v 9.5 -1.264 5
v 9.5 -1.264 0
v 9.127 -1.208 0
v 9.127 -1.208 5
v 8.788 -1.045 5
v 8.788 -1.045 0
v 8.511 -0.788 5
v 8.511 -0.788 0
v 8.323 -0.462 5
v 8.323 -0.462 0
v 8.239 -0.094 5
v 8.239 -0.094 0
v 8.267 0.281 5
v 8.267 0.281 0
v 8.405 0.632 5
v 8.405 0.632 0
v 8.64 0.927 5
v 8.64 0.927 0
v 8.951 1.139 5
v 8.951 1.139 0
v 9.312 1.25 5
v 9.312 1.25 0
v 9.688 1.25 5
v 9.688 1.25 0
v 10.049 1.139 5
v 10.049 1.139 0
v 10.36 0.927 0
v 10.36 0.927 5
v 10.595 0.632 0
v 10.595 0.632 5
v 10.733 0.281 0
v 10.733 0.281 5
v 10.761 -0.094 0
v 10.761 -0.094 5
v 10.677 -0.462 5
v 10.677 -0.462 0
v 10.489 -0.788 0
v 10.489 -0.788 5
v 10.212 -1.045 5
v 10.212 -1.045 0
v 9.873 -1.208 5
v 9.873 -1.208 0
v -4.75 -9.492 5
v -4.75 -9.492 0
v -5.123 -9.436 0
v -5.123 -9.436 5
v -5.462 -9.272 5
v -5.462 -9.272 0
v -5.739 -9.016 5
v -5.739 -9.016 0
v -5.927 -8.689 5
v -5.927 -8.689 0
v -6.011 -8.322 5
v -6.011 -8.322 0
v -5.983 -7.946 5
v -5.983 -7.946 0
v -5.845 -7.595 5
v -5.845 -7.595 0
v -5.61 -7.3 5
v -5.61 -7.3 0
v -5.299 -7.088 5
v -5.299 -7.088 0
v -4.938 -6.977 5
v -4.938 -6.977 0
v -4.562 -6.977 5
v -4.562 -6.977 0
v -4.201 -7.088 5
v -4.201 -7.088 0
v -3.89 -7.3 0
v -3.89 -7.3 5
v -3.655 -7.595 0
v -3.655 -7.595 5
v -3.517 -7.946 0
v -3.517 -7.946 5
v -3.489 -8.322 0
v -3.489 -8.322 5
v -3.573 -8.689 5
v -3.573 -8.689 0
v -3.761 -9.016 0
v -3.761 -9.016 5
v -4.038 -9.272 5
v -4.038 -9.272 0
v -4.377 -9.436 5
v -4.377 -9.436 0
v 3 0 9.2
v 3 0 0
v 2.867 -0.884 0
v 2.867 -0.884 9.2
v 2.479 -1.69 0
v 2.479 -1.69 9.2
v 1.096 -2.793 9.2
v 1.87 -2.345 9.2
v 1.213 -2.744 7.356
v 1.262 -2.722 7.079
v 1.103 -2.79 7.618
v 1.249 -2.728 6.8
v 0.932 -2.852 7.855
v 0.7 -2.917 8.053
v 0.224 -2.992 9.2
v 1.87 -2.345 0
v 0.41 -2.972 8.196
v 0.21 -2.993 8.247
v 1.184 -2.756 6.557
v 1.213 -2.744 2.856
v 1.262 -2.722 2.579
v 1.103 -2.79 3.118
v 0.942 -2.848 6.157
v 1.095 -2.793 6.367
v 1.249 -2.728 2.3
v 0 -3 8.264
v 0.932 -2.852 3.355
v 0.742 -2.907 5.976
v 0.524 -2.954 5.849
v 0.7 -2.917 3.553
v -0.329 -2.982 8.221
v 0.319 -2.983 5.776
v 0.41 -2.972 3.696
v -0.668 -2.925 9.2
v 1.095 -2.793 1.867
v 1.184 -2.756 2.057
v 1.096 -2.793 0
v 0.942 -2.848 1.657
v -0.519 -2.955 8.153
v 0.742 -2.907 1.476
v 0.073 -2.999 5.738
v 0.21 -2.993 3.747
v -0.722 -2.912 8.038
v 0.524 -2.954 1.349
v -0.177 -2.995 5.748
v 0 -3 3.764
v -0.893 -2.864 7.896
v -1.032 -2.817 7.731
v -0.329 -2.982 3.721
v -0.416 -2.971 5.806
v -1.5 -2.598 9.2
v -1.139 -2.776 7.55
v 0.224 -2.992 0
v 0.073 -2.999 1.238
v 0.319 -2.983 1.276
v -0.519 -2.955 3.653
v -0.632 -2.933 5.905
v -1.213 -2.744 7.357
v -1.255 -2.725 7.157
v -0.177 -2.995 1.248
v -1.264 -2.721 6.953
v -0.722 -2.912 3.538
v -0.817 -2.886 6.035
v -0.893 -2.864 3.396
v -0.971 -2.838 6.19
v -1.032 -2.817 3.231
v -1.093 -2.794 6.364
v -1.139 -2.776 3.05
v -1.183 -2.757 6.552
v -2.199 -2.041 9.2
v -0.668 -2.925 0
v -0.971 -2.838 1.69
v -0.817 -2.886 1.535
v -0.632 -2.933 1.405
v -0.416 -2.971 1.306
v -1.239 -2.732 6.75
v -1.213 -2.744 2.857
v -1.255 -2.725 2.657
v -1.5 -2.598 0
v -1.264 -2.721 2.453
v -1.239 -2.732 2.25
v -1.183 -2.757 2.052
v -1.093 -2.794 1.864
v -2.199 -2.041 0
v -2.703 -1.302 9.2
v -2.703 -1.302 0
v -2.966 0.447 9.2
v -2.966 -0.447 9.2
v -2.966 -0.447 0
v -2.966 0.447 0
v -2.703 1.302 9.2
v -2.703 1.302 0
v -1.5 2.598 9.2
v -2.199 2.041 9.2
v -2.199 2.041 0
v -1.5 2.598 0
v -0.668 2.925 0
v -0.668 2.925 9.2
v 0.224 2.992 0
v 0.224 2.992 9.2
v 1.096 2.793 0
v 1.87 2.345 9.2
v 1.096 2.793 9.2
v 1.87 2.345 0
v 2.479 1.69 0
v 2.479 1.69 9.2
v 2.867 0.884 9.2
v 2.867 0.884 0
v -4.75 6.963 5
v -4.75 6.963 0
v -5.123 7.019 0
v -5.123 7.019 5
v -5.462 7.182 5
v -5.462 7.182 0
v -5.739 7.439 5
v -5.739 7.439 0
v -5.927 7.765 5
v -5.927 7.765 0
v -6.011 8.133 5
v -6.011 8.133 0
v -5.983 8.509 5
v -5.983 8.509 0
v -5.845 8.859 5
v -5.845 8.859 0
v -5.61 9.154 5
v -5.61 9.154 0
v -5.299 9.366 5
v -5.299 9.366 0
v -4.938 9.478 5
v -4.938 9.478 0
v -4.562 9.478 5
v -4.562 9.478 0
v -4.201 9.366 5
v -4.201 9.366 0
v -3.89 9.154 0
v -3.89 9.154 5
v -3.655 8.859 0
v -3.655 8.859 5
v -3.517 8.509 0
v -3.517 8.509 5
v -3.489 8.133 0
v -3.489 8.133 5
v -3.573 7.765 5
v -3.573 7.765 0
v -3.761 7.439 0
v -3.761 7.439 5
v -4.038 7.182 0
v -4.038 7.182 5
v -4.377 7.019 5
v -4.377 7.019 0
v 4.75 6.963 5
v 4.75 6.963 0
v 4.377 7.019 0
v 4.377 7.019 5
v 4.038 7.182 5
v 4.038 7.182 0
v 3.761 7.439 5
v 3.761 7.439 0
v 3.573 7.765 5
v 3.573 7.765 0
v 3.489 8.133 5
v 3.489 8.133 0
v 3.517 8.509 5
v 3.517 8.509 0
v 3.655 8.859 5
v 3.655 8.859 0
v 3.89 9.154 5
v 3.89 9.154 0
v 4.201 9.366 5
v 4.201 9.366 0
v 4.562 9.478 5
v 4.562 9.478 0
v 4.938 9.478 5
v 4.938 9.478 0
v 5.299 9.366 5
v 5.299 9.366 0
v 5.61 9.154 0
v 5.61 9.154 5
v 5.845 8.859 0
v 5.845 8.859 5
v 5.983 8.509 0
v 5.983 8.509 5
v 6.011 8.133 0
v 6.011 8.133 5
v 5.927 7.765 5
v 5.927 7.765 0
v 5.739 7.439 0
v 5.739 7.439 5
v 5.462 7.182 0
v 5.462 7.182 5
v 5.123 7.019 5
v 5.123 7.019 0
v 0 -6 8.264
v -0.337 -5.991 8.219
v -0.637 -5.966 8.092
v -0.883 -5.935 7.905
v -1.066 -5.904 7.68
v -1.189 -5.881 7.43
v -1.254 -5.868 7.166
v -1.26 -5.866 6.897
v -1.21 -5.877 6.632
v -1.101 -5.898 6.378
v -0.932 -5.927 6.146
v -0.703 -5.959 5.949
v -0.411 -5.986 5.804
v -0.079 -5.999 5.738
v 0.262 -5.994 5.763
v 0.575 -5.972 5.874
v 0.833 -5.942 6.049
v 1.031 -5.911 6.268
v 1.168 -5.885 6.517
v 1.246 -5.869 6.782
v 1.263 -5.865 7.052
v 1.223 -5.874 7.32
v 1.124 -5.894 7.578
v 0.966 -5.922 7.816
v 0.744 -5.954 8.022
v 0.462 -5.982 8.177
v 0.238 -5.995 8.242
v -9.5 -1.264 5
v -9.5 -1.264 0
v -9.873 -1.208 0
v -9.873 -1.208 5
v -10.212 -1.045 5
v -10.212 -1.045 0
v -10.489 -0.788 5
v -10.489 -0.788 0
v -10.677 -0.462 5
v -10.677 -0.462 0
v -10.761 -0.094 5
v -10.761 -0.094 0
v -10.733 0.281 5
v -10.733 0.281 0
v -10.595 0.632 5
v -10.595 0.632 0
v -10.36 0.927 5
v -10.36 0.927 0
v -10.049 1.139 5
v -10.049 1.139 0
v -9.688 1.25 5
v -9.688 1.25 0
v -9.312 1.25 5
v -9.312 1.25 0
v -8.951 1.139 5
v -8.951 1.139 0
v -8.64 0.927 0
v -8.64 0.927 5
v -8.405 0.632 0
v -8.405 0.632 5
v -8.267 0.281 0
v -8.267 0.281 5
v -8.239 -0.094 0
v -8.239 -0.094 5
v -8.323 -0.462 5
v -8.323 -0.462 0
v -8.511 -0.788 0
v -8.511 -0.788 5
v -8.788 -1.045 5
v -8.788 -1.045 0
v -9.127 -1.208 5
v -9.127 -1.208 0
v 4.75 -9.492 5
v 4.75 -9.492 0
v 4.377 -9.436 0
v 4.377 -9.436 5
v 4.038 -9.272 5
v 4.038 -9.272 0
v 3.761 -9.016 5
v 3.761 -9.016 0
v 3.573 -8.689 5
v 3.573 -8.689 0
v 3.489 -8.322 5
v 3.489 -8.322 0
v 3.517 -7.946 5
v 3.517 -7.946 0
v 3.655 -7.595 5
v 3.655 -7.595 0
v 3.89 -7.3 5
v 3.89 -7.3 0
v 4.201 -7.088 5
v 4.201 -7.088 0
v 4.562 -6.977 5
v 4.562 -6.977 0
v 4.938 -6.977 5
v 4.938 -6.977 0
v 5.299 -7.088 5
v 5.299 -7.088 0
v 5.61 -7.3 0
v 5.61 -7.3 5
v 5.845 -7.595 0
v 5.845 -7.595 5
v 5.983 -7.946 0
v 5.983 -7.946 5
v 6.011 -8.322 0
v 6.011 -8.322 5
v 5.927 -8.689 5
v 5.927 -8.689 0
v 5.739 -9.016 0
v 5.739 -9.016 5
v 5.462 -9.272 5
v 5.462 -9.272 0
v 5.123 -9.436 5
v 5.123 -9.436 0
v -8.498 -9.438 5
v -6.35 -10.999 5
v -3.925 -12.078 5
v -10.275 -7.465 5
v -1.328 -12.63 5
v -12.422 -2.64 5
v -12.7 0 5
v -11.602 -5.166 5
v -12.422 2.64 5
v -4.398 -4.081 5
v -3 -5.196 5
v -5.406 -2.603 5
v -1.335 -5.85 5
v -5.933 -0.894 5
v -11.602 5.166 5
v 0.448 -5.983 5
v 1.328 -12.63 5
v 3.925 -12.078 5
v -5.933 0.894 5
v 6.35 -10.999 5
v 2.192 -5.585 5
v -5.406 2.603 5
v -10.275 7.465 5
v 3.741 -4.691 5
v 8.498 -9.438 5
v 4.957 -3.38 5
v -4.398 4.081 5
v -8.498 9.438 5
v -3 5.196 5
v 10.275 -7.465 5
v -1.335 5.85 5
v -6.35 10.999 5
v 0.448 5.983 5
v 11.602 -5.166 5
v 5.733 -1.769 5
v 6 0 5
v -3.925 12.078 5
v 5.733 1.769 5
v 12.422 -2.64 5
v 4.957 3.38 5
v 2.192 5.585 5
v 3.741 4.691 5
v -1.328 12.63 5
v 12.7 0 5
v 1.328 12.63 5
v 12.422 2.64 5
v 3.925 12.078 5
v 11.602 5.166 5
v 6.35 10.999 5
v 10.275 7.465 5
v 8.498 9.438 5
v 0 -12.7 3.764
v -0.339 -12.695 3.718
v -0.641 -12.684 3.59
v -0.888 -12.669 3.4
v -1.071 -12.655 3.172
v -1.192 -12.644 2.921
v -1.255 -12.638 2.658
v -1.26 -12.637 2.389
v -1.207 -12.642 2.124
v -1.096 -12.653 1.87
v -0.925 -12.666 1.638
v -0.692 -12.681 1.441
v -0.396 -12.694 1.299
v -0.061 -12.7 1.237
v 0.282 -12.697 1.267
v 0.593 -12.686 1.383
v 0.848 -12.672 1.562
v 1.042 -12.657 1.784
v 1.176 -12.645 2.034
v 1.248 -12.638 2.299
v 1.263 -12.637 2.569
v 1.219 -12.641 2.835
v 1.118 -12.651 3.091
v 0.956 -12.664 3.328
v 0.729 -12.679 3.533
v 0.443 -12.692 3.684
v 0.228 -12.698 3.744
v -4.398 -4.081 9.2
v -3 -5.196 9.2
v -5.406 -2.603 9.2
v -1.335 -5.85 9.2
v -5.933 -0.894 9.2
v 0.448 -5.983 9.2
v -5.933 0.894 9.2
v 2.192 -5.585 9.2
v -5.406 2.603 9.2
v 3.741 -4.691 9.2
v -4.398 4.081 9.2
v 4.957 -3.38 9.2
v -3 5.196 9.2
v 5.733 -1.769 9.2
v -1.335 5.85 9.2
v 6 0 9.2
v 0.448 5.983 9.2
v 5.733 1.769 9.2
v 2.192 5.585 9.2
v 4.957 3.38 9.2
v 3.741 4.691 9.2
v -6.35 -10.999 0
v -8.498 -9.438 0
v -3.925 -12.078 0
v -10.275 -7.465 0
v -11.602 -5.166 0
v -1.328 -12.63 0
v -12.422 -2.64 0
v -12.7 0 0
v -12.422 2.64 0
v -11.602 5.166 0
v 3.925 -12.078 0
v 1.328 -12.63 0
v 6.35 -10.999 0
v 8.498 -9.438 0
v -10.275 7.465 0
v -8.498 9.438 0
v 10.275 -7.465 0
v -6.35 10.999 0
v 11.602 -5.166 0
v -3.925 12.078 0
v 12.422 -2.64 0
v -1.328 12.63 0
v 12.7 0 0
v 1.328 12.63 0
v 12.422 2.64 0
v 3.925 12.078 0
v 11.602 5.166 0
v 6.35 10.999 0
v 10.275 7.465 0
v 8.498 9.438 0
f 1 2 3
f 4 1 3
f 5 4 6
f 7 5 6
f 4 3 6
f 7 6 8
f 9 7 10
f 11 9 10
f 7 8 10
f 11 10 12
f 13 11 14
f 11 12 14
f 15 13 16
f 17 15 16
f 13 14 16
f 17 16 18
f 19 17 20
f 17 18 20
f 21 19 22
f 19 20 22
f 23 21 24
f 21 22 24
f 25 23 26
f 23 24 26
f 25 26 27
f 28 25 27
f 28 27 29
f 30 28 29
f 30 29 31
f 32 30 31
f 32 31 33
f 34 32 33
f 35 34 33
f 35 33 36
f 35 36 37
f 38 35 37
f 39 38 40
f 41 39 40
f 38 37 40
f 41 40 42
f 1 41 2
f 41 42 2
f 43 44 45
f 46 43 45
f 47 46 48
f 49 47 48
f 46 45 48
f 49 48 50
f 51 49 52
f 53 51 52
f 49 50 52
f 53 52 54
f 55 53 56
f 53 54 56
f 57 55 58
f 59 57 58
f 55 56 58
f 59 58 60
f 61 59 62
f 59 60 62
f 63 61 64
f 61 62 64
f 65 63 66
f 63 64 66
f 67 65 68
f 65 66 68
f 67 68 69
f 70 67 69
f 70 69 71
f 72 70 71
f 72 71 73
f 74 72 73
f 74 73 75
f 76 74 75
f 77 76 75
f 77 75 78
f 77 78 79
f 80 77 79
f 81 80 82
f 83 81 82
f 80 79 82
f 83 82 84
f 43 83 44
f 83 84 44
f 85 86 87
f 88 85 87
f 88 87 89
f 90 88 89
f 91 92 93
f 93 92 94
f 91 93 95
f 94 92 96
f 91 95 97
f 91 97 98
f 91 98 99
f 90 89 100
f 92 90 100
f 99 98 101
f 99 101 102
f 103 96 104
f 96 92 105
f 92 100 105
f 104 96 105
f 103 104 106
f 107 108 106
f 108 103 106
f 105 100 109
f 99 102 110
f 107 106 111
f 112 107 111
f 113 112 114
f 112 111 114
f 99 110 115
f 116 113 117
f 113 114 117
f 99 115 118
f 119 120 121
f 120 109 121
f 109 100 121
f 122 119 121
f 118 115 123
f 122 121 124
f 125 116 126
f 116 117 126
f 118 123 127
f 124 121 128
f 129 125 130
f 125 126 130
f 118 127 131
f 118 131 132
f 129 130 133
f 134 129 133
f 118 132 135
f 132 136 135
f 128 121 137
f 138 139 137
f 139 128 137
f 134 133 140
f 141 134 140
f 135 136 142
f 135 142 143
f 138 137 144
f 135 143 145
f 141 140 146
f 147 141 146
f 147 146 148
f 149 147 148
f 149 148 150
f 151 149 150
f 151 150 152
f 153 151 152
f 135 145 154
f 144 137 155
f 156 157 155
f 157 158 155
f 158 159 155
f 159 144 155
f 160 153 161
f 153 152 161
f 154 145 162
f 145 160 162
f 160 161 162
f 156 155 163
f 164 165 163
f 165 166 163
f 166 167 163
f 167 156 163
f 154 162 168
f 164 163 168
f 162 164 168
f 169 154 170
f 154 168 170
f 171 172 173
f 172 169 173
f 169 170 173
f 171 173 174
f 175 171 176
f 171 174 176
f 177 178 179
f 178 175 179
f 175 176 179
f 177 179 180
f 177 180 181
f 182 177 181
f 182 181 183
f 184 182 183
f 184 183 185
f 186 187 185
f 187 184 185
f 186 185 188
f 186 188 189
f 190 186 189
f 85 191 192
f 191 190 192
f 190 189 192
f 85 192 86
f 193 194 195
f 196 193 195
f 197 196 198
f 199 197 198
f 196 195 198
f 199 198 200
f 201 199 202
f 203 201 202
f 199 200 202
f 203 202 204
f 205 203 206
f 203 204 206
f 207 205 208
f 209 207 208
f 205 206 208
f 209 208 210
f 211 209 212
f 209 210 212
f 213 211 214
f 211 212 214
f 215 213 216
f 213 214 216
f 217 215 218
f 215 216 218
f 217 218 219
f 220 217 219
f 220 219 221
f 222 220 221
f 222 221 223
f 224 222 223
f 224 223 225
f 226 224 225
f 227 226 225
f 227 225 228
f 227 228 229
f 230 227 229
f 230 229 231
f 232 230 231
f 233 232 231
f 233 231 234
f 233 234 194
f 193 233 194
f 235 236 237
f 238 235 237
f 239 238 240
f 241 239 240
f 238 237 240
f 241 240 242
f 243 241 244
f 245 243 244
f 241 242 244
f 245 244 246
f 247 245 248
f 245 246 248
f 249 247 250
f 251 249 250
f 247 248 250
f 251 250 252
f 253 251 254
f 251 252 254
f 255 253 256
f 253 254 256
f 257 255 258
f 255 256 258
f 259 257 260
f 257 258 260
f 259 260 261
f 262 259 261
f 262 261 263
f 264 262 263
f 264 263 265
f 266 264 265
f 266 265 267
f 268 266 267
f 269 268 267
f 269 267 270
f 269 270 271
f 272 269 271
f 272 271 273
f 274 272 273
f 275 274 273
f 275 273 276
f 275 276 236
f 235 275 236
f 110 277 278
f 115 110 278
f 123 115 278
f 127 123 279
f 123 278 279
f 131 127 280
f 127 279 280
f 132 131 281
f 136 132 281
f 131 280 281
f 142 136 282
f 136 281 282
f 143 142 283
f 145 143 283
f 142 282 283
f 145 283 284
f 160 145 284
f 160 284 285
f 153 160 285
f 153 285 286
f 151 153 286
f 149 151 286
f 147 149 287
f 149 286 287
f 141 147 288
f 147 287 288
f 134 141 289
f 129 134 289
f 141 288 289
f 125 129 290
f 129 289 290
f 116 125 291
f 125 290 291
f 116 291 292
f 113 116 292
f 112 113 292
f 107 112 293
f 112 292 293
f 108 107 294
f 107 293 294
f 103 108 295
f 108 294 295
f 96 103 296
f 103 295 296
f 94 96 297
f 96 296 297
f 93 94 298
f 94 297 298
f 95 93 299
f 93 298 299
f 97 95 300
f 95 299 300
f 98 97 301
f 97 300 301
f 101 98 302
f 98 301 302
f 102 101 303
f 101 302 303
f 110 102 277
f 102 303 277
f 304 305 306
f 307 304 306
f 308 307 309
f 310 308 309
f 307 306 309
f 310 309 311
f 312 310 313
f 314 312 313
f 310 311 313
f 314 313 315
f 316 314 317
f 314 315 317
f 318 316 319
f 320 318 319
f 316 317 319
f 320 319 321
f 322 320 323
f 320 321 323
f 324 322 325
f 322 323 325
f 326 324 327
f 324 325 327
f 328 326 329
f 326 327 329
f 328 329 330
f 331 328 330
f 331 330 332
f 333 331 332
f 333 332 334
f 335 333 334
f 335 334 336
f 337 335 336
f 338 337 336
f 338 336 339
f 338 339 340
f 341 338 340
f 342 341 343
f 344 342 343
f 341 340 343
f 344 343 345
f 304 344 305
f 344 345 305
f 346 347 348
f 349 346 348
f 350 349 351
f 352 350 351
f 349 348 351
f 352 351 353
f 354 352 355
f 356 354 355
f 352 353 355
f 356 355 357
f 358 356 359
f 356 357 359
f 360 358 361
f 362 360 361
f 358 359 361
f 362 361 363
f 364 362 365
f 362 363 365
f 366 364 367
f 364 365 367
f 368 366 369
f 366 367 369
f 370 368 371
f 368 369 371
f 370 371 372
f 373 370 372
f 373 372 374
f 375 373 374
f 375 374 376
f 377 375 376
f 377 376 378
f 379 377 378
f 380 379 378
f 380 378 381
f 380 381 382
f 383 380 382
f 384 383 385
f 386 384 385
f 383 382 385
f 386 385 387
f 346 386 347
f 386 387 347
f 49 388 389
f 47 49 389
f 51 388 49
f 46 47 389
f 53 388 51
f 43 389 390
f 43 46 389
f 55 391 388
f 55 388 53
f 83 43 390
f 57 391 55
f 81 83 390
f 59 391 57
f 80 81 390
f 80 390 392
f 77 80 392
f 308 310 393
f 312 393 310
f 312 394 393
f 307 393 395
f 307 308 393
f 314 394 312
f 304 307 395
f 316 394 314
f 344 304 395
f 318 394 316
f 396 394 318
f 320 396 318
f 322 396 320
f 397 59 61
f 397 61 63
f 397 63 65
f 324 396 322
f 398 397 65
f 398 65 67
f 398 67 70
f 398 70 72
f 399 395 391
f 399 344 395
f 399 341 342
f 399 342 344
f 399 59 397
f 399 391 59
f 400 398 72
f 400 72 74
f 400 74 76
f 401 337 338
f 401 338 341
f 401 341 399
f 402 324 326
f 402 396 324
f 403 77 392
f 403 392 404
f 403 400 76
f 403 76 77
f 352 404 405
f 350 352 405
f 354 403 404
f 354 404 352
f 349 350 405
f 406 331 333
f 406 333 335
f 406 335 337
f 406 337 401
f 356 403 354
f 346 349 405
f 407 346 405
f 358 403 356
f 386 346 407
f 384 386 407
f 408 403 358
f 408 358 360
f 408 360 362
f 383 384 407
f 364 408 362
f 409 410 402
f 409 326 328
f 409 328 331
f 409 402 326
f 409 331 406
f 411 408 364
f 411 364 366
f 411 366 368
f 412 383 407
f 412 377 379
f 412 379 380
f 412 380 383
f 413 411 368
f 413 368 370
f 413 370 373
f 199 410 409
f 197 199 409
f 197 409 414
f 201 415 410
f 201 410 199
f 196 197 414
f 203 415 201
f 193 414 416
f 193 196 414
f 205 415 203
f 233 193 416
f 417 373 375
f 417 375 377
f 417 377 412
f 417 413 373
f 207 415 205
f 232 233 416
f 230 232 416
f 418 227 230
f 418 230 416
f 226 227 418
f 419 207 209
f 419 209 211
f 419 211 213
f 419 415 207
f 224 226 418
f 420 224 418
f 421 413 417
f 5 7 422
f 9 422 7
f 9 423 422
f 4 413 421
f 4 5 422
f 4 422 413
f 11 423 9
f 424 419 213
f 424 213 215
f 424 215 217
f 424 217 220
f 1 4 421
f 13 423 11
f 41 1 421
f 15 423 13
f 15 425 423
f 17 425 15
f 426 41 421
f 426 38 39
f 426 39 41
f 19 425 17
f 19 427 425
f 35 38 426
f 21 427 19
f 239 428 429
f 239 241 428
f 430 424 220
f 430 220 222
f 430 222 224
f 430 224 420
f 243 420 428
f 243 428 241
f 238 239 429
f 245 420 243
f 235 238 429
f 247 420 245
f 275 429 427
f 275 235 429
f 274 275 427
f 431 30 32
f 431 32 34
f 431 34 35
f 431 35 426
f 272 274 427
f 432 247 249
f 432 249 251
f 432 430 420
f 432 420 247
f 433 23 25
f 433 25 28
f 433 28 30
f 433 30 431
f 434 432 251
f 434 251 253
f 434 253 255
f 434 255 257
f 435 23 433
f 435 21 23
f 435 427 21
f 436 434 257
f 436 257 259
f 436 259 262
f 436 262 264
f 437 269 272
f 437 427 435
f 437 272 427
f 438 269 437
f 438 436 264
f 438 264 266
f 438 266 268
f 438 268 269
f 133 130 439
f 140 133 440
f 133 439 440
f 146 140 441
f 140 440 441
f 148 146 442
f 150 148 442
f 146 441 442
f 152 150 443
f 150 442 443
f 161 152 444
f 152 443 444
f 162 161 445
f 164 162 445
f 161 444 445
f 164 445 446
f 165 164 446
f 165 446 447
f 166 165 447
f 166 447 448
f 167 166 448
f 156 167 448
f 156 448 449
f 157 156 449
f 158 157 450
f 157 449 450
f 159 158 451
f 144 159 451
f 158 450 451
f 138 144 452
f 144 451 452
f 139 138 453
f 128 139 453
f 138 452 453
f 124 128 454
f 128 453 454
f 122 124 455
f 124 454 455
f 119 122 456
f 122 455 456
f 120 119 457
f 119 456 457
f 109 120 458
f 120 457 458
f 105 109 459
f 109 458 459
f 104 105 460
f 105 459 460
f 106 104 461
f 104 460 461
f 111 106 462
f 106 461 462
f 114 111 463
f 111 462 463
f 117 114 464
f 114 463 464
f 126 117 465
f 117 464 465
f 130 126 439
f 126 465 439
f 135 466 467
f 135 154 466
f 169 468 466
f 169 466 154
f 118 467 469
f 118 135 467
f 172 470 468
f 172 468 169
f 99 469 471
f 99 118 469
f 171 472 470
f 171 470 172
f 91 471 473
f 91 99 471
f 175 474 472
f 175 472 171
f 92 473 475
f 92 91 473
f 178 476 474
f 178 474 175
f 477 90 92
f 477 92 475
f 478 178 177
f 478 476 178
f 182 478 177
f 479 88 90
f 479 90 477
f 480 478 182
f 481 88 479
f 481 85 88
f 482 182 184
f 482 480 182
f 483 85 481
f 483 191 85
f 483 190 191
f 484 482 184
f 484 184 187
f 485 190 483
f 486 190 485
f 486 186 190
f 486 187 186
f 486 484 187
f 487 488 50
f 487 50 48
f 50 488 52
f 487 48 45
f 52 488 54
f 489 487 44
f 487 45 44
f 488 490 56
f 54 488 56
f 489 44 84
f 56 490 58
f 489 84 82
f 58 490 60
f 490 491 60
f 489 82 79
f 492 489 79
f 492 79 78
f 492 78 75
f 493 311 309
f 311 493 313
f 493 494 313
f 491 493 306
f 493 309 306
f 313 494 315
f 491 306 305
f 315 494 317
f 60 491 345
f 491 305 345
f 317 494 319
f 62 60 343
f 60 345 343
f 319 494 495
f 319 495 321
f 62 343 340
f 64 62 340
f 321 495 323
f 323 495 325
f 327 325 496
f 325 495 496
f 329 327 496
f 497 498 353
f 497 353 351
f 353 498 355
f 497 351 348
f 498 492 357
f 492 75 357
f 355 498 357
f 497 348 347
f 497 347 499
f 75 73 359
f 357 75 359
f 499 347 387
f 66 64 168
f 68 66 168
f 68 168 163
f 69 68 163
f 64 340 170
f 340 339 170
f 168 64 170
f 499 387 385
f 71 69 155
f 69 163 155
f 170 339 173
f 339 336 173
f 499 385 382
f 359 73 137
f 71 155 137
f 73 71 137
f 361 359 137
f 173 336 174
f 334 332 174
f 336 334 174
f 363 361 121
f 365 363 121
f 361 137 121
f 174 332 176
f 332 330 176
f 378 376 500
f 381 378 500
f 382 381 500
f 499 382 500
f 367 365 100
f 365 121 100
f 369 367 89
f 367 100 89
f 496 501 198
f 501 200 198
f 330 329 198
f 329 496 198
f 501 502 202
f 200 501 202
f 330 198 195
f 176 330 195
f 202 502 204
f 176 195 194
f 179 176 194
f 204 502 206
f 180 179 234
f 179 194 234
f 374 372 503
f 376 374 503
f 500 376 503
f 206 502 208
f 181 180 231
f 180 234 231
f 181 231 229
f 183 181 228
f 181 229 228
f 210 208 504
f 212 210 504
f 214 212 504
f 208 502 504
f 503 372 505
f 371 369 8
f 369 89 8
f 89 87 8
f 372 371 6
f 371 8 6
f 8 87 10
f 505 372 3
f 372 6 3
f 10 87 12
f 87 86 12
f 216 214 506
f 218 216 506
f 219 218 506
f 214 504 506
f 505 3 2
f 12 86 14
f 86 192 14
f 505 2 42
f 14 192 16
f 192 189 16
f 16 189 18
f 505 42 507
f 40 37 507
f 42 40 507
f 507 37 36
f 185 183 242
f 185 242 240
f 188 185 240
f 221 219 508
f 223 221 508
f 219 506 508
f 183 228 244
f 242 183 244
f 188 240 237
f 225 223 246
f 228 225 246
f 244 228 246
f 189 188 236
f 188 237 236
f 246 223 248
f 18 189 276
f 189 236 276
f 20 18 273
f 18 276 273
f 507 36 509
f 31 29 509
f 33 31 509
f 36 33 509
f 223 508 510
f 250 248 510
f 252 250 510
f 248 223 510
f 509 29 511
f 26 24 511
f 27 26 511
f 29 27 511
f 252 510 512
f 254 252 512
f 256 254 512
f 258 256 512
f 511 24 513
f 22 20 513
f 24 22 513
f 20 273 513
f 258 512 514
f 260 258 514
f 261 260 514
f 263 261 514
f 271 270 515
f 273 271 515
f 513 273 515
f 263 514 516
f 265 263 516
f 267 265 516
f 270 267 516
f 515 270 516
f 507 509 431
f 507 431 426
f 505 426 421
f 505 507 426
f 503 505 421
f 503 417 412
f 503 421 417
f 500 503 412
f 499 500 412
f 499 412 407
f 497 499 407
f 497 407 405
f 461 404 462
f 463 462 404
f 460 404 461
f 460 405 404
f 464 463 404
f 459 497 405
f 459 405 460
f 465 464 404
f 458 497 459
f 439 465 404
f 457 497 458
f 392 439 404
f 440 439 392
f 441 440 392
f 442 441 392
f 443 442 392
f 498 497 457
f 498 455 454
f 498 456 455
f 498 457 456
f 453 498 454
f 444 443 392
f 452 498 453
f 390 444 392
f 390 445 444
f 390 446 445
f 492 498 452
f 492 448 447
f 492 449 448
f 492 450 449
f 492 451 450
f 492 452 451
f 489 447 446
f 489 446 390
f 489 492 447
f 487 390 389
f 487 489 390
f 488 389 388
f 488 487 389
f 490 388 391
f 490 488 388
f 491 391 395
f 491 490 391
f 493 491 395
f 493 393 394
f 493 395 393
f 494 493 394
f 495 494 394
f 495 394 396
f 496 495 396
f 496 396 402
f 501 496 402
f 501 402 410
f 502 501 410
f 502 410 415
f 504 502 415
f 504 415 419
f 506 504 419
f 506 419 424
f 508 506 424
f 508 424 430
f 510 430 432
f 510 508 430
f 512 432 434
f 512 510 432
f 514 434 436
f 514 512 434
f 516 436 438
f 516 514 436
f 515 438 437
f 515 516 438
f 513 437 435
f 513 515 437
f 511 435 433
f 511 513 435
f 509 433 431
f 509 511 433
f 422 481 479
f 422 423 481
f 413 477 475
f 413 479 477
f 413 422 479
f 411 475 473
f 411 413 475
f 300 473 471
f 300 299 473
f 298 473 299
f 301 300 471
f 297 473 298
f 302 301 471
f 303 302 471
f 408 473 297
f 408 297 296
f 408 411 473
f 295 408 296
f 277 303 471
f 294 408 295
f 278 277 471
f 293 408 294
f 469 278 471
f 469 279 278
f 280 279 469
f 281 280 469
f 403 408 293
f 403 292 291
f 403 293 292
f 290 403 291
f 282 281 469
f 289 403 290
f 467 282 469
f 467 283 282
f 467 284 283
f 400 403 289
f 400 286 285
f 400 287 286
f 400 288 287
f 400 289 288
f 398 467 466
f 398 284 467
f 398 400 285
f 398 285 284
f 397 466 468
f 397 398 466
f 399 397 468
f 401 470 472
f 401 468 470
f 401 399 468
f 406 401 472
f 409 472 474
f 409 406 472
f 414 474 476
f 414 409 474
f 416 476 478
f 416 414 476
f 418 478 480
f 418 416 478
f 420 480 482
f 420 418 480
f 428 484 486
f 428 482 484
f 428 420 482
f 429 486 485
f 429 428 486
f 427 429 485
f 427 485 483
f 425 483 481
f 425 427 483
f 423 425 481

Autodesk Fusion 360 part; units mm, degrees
sketch "Esquisse1" plane through (0, 0, 0) normal (0, 0, 1) x (1, 0, 0)
  circle A0 centre (0, 0) radius 12.7
  circle A1 centre (0, 0) radius 6
  circle A2 centre (0, 0) radius 3
  dimension "d1" = 25.4
  dimension "d2" = 12
  dimension "d3" = 6
extrude "Extrusion1" add sketch "Esquisse1" along normal blind 5 contours A0
extrude "Extrusion2" add sketch "Esquisse1" along normal blind 9.2 contours A1
sketch "Esquisse2" plane through (0, 0, 5) normal (0, 0, 1) x (-1, 0, 0)
  circle A0 centre (0, 0) radius 6
  circle A1 centre (0, 0) radius 12.7
  circle A2 centre (0, 0) radius 9.5
  circle A3 centre (-9.5, 0) radius 0.445
  circle A4 centre (-4.75, -8.2272) radius 0.445
  circle A5 centre (4.75, -8.2272) radius 0.445
  circle A6 centre (9.5, 0) radius 0.445
  circle A7 centre (4.75, 8.2272) radius 0.445
  circle A8 centre (-4.75, 8.2272) radius 0.445
  point P0 (-4.75, -8.2272)
  point P1 (4.75, -8.2272)
  point P2 (9.5, 0)
  point P3 (4.75, 8.2272)
  point P4 (-4.75, 8.2272)
  dimension "d8" = 19
  dimension "d10" = 0.89
  dimension "d12" = 360
  dimension "d13" = 0.89
  dimension "d14" = 0.89
  dimension "d15" = 0.89
  dimension "d16" = 0.89
  dimension "d17" = 0.89
hole "Perçage1" at (4.75, 8.2272, 5) at (-4.75, 8.2272, 5) at (-9.5, 0, 5) at (-4.75, -8.2272, 5) at (4.75, -8.2272, 5) at (9.5, 0, 5) direction (0, 0, -1) diameter 2.529 depth 6 tip angle 118
sketch "Esquisse3" plane through (0, 0, 0) normal (0, 1, 0) x (1, 0, 0)
  circle A0 centre (0, -2.5) radius 0.445
  circle A1 centre (0, -7) radius 0.445
  dimension "d23" = 0.89
  dimension "d24" = 0.89
hole "Perçage2" at (0, 0, 7) at (0, 0, 2.5) direction (0, -1, 0) diameter 2.529 depth 22.5 tip angle 118
